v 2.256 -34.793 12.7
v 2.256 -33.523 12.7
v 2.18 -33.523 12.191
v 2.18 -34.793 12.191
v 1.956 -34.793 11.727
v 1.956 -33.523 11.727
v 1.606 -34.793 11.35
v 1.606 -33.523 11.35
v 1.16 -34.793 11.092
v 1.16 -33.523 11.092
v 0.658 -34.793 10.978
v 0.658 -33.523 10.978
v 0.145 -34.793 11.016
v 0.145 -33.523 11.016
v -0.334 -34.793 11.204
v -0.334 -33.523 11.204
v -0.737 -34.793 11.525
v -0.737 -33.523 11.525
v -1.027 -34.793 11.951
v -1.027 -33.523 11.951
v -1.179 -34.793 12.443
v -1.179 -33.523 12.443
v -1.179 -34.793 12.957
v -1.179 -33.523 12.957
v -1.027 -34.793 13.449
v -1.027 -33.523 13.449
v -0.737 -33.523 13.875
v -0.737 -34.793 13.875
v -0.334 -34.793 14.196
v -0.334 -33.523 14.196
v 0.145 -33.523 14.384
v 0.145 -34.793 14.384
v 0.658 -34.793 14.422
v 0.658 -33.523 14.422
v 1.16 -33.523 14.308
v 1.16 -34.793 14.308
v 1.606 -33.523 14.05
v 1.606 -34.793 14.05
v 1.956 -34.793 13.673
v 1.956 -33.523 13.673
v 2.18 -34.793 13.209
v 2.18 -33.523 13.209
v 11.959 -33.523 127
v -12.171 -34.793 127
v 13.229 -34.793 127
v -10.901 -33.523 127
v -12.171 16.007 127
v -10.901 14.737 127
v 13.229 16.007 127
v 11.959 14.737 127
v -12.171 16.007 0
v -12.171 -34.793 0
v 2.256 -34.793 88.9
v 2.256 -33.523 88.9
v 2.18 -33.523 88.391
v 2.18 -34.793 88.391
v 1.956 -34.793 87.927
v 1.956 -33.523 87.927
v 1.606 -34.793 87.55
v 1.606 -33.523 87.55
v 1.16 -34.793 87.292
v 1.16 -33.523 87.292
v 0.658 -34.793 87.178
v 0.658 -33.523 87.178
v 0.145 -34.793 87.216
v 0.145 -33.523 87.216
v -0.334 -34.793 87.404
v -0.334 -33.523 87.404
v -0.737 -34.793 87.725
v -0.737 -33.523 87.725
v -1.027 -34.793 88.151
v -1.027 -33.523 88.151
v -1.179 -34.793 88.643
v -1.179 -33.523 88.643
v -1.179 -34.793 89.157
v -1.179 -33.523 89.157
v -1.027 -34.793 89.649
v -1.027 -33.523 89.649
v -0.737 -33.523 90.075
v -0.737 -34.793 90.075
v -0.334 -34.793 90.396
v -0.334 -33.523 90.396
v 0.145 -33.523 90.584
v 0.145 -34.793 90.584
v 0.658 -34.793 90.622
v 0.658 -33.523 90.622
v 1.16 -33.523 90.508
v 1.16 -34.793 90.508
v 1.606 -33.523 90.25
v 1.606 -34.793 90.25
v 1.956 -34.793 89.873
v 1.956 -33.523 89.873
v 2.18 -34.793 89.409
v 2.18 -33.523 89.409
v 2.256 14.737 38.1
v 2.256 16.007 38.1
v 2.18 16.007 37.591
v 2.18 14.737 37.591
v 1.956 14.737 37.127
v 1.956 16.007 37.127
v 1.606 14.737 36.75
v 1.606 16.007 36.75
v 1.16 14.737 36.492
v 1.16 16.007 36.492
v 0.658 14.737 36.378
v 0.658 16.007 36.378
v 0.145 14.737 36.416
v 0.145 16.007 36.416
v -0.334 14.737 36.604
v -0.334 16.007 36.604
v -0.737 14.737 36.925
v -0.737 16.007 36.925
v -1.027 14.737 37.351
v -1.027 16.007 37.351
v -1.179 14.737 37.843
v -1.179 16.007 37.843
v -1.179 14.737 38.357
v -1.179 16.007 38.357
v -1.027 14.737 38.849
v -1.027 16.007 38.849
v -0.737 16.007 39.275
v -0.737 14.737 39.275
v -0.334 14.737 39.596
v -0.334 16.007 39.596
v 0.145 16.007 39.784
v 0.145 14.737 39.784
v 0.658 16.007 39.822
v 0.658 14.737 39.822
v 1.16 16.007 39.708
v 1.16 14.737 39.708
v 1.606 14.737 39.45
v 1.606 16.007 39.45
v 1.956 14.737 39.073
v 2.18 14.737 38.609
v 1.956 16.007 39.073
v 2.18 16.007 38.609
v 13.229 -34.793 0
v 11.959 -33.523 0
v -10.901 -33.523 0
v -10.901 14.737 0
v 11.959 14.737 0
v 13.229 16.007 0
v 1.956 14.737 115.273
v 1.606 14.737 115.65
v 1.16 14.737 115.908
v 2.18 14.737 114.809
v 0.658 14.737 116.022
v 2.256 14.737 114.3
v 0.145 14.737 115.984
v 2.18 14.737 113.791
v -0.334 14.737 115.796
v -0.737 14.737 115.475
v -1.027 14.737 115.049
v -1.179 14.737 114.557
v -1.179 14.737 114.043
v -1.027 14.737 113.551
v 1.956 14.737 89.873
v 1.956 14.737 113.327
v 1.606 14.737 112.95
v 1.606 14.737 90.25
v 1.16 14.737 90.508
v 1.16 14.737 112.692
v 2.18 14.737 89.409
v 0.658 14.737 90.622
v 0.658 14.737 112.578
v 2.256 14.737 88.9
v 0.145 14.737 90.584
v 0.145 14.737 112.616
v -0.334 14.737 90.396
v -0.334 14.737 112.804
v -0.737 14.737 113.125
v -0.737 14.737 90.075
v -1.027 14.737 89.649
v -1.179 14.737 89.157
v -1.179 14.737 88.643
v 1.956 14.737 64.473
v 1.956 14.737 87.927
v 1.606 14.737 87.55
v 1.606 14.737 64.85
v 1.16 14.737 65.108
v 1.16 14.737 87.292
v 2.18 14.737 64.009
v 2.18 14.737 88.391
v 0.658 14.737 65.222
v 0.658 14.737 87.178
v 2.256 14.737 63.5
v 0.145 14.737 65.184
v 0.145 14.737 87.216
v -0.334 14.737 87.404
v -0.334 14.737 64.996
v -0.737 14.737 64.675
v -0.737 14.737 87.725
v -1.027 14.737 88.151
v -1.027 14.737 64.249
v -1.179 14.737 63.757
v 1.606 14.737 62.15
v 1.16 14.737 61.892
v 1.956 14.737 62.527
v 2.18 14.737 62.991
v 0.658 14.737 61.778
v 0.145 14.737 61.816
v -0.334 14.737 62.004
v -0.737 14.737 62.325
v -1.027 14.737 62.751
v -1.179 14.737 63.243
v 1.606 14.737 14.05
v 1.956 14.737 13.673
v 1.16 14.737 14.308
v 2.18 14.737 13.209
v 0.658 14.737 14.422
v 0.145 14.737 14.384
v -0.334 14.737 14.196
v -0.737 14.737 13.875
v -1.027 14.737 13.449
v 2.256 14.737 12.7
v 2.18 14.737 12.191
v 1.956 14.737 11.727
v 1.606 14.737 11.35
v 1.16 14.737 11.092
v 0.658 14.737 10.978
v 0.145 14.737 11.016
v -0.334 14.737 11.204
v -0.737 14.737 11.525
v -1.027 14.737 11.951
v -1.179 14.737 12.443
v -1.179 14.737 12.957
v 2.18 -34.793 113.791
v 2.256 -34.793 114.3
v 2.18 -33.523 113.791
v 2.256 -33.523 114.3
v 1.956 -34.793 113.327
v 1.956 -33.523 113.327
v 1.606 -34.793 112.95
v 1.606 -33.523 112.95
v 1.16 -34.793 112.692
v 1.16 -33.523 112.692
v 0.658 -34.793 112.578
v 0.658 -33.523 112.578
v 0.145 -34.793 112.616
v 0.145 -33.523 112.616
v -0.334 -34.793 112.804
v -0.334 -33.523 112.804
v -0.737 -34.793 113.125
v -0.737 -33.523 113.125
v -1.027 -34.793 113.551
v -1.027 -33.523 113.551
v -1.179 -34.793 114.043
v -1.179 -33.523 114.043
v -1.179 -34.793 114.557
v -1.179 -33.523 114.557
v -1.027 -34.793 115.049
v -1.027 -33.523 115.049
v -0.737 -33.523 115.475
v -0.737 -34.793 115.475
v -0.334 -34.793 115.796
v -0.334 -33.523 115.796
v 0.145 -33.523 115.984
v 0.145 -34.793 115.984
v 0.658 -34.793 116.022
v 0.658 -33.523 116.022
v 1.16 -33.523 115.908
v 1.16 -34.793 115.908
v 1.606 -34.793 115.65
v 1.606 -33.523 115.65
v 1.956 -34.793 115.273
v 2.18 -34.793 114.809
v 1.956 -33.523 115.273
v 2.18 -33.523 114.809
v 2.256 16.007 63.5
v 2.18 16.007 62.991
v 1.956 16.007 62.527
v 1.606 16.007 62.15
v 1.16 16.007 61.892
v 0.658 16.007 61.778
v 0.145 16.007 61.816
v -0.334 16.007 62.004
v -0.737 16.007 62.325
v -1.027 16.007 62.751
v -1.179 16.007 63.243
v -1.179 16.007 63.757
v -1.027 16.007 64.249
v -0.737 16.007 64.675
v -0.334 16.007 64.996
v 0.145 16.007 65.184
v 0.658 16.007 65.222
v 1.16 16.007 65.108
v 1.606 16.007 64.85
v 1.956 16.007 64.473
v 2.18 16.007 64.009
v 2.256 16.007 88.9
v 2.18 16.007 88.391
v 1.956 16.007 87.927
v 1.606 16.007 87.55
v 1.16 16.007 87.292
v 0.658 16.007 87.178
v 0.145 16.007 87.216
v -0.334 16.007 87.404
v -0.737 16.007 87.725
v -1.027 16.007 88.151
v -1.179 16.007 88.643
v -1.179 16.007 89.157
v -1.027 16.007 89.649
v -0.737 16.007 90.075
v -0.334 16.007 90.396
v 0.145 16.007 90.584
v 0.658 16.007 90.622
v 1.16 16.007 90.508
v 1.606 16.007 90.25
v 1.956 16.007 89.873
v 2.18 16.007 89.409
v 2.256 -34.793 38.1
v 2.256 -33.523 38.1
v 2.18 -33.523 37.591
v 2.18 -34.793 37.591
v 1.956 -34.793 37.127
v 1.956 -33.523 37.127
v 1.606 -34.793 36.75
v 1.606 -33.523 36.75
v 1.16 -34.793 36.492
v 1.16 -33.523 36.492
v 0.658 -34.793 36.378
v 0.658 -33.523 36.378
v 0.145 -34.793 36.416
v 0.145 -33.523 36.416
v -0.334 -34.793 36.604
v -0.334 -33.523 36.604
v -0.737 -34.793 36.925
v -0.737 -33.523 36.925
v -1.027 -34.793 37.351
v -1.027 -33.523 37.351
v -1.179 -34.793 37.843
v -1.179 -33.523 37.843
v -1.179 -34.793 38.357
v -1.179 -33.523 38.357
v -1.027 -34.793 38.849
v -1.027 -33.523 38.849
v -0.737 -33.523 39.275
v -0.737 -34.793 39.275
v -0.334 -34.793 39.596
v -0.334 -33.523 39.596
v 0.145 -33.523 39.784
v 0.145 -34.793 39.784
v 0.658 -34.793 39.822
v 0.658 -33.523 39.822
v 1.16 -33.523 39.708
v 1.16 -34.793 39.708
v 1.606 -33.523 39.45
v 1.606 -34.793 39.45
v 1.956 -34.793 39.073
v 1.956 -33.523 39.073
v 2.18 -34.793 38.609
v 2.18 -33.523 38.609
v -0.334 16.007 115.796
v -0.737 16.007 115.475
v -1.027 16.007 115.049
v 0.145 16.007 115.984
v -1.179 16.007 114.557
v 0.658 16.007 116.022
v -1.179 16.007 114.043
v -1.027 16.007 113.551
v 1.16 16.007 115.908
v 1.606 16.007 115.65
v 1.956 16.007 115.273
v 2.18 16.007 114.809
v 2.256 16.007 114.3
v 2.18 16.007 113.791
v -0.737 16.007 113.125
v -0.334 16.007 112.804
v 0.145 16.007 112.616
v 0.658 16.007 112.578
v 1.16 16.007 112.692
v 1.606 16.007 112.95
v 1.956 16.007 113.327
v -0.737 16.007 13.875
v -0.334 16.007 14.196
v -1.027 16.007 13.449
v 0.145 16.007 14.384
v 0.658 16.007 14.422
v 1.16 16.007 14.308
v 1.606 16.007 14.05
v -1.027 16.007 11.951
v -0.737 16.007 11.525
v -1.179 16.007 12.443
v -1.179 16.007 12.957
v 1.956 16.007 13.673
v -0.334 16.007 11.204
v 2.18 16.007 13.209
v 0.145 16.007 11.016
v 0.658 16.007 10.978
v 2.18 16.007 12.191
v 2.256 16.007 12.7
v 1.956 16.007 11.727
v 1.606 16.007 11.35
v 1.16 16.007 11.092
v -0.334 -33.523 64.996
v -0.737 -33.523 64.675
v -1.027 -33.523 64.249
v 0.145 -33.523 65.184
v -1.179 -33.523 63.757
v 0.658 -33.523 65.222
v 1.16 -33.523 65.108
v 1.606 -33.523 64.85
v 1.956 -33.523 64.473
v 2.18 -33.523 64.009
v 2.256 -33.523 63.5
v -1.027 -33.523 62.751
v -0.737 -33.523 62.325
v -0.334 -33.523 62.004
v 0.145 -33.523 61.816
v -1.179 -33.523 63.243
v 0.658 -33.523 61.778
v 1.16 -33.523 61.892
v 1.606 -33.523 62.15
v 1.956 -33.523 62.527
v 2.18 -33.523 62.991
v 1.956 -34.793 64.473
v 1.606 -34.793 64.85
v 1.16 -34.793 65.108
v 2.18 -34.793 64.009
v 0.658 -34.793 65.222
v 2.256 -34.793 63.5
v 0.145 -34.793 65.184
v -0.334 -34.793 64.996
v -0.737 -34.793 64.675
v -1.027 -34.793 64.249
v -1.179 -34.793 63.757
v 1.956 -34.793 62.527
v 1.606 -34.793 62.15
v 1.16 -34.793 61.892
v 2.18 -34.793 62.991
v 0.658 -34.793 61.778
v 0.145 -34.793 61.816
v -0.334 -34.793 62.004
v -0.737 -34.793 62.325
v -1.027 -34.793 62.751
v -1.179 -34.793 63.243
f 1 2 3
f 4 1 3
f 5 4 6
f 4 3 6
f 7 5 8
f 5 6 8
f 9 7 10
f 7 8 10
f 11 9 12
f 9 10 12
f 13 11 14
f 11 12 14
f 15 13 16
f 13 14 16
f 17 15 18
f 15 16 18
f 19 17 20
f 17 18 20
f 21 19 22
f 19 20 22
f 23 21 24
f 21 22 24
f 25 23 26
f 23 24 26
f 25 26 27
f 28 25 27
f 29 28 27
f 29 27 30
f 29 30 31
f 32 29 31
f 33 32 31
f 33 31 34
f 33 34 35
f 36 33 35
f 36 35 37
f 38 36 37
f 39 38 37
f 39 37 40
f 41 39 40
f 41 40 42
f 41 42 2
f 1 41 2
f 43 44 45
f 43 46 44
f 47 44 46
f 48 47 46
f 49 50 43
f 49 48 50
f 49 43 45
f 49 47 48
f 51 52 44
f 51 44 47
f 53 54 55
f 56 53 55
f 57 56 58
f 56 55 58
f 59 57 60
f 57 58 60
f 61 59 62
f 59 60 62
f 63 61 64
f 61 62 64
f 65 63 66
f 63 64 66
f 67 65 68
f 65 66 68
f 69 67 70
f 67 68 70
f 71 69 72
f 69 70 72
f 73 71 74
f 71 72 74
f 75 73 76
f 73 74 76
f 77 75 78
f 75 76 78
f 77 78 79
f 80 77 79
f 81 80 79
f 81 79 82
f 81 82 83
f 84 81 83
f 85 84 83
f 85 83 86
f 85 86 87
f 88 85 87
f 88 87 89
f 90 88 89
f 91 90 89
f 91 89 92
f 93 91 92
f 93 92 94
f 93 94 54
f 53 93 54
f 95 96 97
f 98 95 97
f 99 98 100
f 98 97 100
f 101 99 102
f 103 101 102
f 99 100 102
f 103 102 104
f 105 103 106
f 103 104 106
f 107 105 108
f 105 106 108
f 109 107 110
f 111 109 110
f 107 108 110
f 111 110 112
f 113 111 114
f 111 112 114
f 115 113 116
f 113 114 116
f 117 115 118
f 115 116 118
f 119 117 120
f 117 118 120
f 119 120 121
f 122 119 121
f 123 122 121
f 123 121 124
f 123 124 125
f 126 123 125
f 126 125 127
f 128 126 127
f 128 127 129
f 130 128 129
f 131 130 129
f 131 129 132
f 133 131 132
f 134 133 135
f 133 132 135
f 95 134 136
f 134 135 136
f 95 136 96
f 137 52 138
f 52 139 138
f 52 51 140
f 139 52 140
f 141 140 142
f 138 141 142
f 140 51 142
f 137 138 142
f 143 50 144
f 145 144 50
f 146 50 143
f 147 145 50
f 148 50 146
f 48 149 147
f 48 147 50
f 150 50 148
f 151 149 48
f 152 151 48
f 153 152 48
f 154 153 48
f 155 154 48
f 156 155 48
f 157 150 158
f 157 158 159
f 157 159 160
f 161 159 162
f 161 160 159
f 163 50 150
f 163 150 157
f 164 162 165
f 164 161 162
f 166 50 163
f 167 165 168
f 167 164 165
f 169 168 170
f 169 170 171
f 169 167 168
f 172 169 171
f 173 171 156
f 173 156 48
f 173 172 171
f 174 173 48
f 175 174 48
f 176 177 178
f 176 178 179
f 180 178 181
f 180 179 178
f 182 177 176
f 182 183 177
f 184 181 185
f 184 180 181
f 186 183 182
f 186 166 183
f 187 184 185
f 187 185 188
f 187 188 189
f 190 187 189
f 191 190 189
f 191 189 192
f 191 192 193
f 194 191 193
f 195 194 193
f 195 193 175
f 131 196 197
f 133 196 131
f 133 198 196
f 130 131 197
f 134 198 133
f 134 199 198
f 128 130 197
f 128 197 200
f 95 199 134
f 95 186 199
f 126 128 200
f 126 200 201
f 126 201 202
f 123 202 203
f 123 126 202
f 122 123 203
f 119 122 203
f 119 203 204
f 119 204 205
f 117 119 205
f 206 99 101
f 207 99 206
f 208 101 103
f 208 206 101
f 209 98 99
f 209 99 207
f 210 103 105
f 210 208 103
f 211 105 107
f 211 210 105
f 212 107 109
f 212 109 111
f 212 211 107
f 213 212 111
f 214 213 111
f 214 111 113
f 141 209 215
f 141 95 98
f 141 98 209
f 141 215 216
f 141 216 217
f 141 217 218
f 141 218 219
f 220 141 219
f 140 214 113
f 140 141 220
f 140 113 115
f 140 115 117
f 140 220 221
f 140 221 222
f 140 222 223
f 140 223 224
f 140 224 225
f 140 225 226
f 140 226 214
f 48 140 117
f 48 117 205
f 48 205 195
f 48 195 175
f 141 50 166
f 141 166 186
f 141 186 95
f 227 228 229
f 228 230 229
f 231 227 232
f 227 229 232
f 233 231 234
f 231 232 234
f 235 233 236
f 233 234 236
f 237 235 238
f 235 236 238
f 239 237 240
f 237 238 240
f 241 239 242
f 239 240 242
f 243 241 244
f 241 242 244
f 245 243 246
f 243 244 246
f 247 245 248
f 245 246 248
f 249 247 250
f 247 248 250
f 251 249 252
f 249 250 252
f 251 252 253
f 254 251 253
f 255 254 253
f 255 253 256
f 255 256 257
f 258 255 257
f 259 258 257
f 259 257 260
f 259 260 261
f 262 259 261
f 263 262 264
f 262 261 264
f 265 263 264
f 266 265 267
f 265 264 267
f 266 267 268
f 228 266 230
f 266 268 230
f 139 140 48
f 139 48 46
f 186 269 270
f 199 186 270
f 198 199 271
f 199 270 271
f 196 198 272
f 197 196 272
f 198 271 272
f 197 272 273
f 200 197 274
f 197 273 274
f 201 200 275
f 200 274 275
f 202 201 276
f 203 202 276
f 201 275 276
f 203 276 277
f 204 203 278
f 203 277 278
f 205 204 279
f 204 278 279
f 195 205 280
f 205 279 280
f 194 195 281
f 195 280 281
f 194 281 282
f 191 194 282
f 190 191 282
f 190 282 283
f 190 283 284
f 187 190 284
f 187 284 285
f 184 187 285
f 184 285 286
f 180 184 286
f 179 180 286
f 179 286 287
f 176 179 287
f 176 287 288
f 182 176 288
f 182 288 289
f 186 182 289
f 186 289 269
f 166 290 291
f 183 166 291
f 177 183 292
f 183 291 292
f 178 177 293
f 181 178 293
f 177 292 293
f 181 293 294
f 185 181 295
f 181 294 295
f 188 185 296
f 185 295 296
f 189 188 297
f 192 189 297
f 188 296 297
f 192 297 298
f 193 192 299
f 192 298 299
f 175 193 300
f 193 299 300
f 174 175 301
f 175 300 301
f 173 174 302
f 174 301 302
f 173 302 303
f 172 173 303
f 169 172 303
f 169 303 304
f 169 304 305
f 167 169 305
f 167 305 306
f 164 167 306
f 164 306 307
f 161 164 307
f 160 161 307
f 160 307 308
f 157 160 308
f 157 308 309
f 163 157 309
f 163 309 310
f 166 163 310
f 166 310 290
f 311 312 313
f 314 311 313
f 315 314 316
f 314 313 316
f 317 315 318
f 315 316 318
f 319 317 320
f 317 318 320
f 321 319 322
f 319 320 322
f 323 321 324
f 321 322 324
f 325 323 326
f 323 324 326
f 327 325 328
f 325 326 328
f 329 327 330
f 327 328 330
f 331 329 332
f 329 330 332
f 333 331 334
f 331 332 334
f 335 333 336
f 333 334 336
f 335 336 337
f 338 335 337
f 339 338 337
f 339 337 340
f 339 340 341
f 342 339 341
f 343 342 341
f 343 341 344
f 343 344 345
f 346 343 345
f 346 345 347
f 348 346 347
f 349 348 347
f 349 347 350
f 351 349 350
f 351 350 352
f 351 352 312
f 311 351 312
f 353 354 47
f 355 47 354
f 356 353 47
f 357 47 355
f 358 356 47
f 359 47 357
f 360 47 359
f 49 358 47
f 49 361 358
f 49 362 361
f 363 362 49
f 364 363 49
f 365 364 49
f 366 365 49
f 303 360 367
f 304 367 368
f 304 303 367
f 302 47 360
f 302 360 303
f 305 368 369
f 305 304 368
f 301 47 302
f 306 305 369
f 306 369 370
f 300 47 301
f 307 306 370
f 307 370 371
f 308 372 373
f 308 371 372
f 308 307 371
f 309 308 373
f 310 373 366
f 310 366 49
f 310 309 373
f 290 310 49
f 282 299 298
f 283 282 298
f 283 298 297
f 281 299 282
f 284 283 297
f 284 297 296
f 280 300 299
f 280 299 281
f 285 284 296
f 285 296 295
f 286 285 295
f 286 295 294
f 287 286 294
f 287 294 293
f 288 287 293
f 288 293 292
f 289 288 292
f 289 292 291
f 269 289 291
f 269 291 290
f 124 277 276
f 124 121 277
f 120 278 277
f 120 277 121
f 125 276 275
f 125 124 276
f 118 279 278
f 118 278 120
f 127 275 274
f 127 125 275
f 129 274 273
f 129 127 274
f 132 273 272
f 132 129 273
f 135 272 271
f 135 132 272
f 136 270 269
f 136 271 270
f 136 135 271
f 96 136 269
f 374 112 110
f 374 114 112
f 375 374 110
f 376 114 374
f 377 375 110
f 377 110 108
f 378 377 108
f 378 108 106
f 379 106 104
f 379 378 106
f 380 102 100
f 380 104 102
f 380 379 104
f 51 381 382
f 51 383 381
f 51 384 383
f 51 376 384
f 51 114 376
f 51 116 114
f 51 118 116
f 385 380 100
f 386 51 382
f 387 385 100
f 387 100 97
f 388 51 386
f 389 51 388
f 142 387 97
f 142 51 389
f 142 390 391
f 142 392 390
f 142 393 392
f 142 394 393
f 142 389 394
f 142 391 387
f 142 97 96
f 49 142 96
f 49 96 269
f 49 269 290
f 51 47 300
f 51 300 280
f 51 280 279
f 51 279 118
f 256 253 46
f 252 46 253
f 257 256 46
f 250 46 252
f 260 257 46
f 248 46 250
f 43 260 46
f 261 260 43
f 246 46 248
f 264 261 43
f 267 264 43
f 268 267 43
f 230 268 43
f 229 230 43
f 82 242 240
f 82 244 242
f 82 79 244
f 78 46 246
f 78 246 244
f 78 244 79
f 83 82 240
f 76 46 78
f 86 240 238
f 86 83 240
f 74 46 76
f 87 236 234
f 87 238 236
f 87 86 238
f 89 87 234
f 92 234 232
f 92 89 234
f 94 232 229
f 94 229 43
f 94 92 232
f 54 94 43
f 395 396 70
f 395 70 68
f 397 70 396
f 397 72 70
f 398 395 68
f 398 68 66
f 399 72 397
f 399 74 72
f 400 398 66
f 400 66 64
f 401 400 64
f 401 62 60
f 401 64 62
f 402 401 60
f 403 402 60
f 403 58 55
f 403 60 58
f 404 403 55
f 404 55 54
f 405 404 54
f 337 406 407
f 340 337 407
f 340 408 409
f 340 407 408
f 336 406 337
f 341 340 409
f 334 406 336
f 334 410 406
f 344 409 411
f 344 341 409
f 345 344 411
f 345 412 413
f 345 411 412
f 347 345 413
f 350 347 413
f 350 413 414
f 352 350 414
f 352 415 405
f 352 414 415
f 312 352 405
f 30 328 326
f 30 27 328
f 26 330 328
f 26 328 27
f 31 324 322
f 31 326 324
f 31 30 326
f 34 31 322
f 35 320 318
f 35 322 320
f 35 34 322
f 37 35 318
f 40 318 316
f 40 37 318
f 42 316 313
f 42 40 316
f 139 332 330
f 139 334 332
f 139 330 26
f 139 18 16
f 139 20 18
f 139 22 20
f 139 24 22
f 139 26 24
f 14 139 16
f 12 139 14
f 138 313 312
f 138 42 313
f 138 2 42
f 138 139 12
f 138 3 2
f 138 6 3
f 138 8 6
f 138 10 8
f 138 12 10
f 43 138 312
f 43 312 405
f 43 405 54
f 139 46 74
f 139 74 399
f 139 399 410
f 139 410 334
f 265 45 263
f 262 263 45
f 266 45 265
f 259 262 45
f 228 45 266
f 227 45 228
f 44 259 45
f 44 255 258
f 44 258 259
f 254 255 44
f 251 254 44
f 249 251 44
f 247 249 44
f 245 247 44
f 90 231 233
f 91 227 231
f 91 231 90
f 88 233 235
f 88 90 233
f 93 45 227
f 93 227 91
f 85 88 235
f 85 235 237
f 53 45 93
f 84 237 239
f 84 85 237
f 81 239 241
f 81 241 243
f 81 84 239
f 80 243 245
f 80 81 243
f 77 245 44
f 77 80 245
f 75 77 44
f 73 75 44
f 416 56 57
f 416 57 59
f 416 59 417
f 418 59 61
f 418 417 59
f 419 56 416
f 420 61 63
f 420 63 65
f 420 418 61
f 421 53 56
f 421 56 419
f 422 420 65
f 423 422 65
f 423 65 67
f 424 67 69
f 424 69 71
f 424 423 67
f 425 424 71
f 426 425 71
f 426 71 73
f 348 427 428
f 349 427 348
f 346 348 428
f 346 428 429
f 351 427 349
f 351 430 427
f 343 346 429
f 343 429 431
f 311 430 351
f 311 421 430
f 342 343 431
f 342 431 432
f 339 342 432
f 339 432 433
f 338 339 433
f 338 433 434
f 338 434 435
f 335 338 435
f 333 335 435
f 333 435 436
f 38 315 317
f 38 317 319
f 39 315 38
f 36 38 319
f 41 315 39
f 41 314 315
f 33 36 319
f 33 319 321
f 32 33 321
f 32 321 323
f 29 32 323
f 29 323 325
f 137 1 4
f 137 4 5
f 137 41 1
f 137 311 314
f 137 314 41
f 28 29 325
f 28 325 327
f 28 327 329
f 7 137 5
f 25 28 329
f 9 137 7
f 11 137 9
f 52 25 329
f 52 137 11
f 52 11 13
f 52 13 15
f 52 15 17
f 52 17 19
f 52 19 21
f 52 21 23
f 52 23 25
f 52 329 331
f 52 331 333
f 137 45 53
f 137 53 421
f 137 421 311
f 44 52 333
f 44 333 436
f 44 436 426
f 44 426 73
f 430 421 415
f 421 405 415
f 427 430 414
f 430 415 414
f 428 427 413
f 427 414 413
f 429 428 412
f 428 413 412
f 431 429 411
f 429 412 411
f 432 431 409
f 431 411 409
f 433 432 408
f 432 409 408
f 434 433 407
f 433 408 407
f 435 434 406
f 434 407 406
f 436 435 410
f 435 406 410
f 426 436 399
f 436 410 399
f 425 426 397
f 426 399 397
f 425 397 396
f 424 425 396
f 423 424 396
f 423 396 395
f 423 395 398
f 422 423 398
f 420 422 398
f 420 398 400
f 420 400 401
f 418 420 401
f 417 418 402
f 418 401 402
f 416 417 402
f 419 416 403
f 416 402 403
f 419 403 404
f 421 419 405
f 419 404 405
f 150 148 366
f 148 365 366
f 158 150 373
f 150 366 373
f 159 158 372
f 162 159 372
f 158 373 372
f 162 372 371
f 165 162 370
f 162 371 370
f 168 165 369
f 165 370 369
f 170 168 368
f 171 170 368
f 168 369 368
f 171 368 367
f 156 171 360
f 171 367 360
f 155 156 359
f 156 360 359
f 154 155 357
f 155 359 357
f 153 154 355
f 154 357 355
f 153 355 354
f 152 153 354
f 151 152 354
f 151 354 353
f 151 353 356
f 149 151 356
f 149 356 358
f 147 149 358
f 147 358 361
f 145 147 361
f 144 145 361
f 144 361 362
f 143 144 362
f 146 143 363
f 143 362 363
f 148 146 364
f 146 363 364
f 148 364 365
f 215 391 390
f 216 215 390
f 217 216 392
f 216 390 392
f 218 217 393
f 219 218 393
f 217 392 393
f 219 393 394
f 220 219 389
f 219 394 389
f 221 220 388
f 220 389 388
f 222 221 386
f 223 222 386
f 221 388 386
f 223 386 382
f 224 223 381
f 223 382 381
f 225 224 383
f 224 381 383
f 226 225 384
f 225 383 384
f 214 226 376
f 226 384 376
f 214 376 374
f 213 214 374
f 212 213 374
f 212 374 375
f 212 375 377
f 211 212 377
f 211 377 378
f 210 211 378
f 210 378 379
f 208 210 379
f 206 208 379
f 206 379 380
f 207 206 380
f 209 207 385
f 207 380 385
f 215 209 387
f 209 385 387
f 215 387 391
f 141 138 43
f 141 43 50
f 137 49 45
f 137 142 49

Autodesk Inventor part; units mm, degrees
ref_plane "YZ Plane" through (0, 0, 0) normal (1, 0, 0) x (0, 1, 0)
ref_plane "XZ Plane" through (0, 0, 0) normal (0, 1, 0) x (-1, 0, 0)
ref_plane "XY Plane" through (0, 0, 0) normal (0, 0, 1) x (1, 0, 0)
sketch "Sketch1" plane through (0, 0, 0) normal (0, 0, 1) x (1, 0, 0)
  line L0 (-12.1708, 16.0073) -> (13.2292, 16.0073)
  line L1 (13.2292, 16.0073) -> (13.2292, -34.7927)
  line L2 (13.2292, -34.7927) -> (-12.1708, -34.7927)
  line L3 (-12.1708, -34.7927) -> (-12.1708, 16.0073)
  line L4 (11.9592, 14.7373) -> (-10.9008, 14.7373)
  line L5 (-10.9008, 14.7373) -> (-10.9008, -33.5227)
  line L6 (-10.9008, -33.5227) -> (11.9592, -33.5227)
  line L7 (11.9592, -33.5227) -> (11.9592, 14.7373)
  point P0 (0, 0)
  dimension "d0" = 25.4
  dimension "d1" = 50.8
  dimension "d2" = 1.27
extrude "Extrusion1" add sketch "Sketch1" along normal blind 127
sketch "Sketch2" plane through (-12.1708, 16.0073, 0) normal (0, 1, 0) x (1, 0, 0)
  circle A0 centre (12.7, -12.7) radius 1.7272
  line L0 (25.4, 0) -> (0, 0) projected
  line L1 (0, 0) -> (0, -127) projected
  point P0 (12.1708, 0)
  dimension "d5" = 3.4544
  dimension "d6" = 12.7
  dimension "d7" = 12.7
extrude "Extrusion2" cut sketch "Sketch2" against normal through all
pattern_linear "Rectangular Pattern1" count 13 spacing 25.4 along (0, 0, 1) of "Extrusion2"
equation "\"d3\" = d13"
equation "\"d10\" = d14"
equation "\"d13\" = 127"
equation "\"d14\" = d13"
properties part number "VerseFrame 5in STOCK"
